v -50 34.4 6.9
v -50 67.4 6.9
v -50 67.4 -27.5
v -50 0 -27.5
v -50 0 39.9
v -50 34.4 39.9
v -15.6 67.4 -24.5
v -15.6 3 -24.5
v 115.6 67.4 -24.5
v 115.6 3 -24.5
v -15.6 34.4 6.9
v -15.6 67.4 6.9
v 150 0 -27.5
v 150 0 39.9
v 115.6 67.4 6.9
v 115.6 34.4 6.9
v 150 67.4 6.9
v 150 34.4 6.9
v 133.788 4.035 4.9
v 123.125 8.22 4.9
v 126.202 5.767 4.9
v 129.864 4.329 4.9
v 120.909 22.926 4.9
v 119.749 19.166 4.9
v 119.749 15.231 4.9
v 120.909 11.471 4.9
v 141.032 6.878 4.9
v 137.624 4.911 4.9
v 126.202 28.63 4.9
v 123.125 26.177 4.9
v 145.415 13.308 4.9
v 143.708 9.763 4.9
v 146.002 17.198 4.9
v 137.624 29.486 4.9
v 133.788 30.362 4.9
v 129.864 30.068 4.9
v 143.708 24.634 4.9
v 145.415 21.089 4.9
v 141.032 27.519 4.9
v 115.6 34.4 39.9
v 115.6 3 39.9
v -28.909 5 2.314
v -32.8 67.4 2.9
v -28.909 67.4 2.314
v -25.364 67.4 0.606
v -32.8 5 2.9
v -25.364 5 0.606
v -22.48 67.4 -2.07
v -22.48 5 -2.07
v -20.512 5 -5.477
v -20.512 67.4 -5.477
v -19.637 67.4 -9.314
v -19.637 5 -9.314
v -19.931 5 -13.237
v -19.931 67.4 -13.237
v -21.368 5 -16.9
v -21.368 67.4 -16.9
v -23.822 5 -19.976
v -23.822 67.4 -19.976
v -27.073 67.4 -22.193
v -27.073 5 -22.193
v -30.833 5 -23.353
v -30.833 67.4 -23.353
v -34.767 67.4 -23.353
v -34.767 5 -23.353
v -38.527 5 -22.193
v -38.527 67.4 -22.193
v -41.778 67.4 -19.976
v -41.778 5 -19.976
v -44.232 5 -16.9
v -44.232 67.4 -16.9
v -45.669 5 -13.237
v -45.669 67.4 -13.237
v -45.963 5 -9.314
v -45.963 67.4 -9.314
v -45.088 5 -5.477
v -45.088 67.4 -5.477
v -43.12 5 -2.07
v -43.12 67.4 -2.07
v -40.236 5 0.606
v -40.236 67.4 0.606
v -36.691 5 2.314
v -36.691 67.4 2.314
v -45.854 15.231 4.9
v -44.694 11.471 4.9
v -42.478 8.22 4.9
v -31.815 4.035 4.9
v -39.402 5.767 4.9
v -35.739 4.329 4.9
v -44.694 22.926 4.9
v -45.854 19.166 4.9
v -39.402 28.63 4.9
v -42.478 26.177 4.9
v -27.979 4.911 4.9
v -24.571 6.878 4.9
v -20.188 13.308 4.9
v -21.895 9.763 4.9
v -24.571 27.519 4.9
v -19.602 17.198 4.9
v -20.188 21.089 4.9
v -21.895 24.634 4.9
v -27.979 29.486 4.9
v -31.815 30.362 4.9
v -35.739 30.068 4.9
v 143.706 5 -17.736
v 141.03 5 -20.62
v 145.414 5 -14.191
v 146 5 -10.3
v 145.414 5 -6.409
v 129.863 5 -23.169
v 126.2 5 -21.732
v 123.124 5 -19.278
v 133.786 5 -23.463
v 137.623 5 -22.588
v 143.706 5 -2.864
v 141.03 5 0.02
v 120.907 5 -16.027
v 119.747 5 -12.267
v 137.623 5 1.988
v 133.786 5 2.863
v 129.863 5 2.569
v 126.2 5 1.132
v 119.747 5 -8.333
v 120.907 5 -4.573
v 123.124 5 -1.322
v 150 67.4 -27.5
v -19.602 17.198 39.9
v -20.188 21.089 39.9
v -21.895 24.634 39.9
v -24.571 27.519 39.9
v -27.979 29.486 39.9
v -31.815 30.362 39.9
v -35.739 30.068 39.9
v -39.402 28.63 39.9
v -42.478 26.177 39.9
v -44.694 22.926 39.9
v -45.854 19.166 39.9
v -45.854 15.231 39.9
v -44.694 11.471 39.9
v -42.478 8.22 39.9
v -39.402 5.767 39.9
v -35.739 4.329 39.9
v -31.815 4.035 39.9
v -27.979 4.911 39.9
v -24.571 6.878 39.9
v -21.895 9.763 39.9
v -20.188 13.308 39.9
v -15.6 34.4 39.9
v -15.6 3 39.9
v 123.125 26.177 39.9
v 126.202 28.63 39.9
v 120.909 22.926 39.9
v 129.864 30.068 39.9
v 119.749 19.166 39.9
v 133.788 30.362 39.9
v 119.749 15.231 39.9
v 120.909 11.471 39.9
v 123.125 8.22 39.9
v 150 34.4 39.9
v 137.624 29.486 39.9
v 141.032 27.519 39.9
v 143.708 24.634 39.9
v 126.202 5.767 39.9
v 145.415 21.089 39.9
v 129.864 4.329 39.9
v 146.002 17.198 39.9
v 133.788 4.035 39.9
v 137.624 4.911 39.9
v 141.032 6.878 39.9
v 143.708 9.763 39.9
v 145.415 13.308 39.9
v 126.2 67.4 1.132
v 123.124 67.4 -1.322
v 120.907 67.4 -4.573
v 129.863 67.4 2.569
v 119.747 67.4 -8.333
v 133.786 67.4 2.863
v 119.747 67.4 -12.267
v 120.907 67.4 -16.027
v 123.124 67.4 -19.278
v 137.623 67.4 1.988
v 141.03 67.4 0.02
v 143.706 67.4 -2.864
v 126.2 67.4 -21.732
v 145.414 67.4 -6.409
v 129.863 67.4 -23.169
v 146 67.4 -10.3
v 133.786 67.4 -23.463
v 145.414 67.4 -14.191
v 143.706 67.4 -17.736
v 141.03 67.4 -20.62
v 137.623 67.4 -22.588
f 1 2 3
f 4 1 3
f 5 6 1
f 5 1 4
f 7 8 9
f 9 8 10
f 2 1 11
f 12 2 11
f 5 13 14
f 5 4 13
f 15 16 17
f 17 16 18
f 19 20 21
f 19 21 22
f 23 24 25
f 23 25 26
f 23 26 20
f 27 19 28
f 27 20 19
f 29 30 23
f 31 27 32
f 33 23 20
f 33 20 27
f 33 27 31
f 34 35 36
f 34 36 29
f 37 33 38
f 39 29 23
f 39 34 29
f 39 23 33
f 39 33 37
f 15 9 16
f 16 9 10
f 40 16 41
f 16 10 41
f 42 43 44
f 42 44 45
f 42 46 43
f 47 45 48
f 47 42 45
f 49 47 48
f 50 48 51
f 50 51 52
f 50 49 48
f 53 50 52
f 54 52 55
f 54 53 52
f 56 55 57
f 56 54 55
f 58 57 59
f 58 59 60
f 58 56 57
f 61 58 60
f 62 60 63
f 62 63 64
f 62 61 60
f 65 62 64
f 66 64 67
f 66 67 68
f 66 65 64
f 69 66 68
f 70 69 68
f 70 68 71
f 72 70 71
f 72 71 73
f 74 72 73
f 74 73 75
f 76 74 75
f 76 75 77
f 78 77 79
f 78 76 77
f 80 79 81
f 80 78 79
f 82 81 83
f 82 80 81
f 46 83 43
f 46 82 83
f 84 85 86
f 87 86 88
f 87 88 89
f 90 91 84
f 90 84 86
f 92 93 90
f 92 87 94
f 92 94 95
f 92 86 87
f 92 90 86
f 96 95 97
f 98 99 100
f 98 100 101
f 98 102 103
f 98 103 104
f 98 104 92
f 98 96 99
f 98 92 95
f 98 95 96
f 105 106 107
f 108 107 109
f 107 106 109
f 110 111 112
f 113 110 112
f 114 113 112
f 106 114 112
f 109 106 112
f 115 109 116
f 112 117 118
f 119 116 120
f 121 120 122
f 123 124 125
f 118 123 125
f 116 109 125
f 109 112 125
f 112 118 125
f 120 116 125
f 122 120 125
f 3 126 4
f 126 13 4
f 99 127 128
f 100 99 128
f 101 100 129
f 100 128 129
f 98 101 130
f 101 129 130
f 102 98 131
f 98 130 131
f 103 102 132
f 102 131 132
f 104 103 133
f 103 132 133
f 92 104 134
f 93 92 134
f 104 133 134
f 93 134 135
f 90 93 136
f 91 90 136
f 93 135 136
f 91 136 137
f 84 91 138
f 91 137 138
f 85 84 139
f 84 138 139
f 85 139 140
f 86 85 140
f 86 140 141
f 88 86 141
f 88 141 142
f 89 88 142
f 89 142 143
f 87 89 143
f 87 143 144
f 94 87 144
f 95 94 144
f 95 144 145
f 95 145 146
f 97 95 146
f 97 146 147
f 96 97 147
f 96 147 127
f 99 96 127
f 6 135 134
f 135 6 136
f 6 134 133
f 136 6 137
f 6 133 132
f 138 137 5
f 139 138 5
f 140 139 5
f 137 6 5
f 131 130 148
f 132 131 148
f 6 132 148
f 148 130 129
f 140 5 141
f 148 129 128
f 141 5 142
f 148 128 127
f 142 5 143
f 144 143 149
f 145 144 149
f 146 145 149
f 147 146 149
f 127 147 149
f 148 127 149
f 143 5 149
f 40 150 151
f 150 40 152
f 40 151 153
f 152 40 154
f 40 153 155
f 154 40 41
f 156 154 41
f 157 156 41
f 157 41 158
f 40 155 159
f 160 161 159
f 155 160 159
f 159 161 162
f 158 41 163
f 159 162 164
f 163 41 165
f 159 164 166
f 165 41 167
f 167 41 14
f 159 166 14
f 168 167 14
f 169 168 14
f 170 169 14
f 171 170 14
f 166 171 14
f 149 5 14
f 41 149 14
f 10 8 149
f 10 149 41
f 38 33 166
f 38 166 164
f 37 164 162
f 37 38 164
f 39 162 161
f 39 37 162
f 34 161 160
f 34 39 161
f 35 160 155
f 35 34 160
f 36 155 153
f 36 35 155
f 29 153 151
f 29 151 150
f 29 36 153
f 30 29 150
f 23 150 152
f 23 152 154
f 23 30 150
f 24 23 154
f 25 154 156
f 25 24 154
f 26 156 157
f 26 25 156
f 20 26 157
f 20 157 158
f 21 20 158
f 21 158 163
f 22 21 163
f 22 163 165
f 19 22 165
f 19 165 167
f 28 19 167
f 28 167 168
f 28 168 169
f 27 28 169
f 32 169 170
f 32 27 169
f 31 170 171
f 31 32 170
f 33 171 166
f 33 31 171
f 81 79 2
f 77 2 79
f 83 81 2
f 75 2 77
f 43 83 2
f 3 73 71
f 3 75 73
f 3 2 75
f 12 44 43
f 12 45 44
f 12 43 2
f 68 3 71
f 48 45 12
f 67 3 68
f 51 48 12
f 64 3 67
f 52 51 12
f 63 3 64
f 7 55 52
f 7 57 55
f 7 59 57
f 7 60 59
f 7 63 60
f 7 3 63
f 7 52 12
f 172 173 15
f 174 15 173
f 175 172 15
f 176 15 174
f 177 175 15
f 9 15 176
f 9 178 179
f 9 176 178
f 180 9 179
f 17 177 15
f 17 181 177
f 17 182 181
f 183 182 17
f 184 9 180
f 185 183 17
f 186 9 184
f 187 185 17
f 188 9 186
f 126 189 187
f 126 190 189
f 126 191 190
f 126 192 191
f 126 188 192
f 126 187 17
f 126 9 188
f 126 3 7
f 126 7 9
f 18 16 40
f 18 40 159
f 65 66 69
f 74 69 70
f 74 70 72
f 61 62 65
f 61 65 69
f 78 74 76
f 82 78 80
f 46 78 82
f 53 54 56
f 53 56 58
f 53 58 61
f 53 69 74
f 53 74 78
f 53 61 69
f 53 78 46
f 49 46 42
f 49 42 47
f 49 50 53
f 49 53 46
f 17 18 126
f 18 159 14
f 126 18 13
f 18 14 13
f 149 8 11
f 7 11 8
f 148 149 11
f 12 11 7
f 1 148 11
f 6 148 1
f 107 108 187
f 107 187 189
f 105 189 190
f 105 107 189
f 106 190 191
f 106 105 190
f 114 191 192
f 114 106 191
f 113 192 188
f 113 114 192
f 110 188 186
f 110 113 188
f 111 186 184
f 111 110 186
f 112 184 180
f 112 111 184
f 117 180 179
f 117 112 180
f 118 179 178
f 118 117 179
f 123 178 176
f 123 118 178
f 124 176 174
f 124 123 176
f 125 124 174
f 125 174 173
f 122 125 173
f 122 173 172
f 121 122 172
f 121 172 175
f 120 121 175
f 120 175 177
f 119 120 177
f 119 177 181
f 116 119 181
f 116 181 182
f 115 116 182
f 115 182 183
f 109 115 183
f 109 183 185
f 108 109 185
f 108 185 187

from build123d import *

# Parameters (mm, degrees)
SKETCH1_R           = 13.2
BOSS_EXTRUDE3_DEPTH = 5
SKETCH1_6_W         = 100
SKETCH1_6_H         = 55
SKETCH1_6_R         = 13.2
BOSS_EXTRUDE4_DEPTH = 55
SKETCH2_W           = 65.6
SKETCH2_H           = 52
CUT_EXTRUDE1_DEPTH  = 52
SKETCH3_R           = 13.2
CUT_EXTRUDE2_DEPTH  = 22.6
SKETCH4_W           = 20.6
SKETCH4_H           = 20.6
CUT_EXTRUDE4_DEPTH  = 39
SKETCH9_R           = 13.2
BOSS_EXTRUDE5_DEPTH = 12.4
BOSS_EXTRUDE7_START = 12.4
SKETCH10_R          = 13.2
BOSS_EXTRUDE7_DEPTH = 12.4
MIRROR1_START       = 30.398461356
MIRROR1_OUTLINE_R   = 13.2
MIRROR1_DEPTH       = 37.001538644
MIRROR1_2_OUTLINE_W = 100
MIRROR1_2_OUTLINE_H = 67.4
MIRROR1_2_OUTLINE_R = 13.2
MIRROR1_2_DEPTH     = 3
MIRROR1_3_OUTLINE_W = 34.4
MIRROR1_3_OUTLINE_H = 33
MIRROR1_3_DEPTH     = 4.001538644
MIRROR1_START_2     = 3
MIRROR1_4_OUTLINE_R = 13.2
MIRROR1_4_DEPTH     = 0.998461256
MIRROR1_START_3     = 3.998461256
MIRROR1_5_OUTLINE_R = 13.2
MIRROR1_5_DEPTH     = 26.4000001
MIRROR1_START_4     = 4.9
MIRROR1_6_OUTLINE_R = 13.2
MIRROR1_6_DEPTH     = 35


with BuildPart() as part:
    # Sketch1 → Boss-Extrude3 (new body)
    with BuildSketch(Plane(origin=(0, 0, 0), x_dir=(1, 0, 0), z_dir=(0, 1, 0))):
        with Locations(Location((-32.8, 10.3, 0), (0, 0, 270))):
            Circle(SKETCH1_R)
    boss_extrude3 = extrude(amount=BOSS_EXTRUDE3_DEPTH)

    # Sketch1<6> → Boss-Extrude4 (add)
    with BuildSketch(Plane(origin=(0, 0, 0), x_dir=(1, 0, 0), z_dir=(0, 1, 0))):
        Rectangle(SKETCH1_6_W, SKETCH1_6_H)
        with Locations(Location((-32.8, 10.3, 0), (0, 0, 270))):
            Circle(SKETCH1_6_R, mode=Mode.SUBTRACT)
    extrude(amount=BOSS_EXTRUDE4_DEPTH)

    # Sketch2 → Cut-Extrude1 (cut)
    with BuildSketch(Plane(origin=(0, 55, 0), x_dir=(1, 0, 0), z_dir=(0, 1, 0))):
        with Locations((17.2, -1.5)):
            Rectangle(SKETCH2_W, SKETCH2_H)
    extrude(amount=-CUT_EXTRUDE1_DEPTH, mode=Mode.SUBTRACT)

    # Sketch3 → Cut-Extrude2 (cut)
    with BuildSketch(Plane.XY.offset(27.5)):
        with Locations((-32.801538644, 17.198461356)):
            Circle(SKETCH3_R)
    extrude(amount=-CUT_EXTRUDE2_DEPTH, mode=Mode.SUBTRACT)

    # Sketch4 → Cut-Extrude4 (cut)
    with BuildSketch(Plane.ZY.offset(50)):
        with Locations((17.2, 44.7)):
            Rectangle(SKETCH4_W, SKETCH4_H)
    extrude(amount=-CUT_EXTRUDE4_DEPTH, mode=Mode.SUBTRACT)

    # Sketch9 → Boss-Extrude5 (add)
    with BuildSketch(Plane(origin=(0, 55, 0), x_dir=(1, 0, 0), z_dir=(0, 1, 0))):
        Polygon((-50, -6.9), (-15.6, -6.9), (-15.6, 24.5), (50, 24.5), (50, 27.5), (-50, 27.5), align=None)
        with Locations(Location((-32.8, 10.3, 0), (0, 0, 270))):
            Circle(SKETCH9_R, mode=Mode.SUBTRACT)
    extrude(amount=BOSS_EXTRUDE5_DEPTH)

    # Sketch10 → Boss-Extrude7 (add)
    with BuildSketch(Plane.XY.offset(27.5).offset(BOSS_EXTRUDE7_START)):
        Polygon((-15.6, 3), (-15.6, 34.4), (-50, 34.4), (-50, 0), (50, 0), (50, 3), align=None)
        with Locations((-32.801538644, 17.198461356)):
            Circle(SKETCH10_R, mode=Mode.SUBTRACT)
    extrude(amount=-BOSS_EXTRUDE7_DEPTH)

    # Mirror1: read off the stored shape, not the designer's step
    # Mirror1 outline → Mirror1 (add)
    with BuildSketch(Plane(origin=(0, 0, 0), x_dir=(1, 0, 0), z_dir=(0, 1, 0)).offset(MIRROR1_START)):
        Polygon((150, -6.9), (150, 27.5), (50, 27.5), (50, 24.5), (115.6, 24.5), (115.6, -6.9), align=None)
        with Locations((132.8, 10.3)):
            Circle(MIRROR1_OUTLINE_R, mode=Mode.SUBTRACT)
    extrude(amount=MIRROR1_DEPTH)

    # Mirror1 2 outline → Mirror1 2 (add)
    with BuildSketch(Plane(origin=(0, 0, 0), x_dir=(1, 0, 0), z_dir=(0, 1, 0))):
        with Locations((100, -6.2)):
            Rectangle(MIRROR1_2_OUTLINE_W, MIRROR1_2_OUTLINE_H)
        with Locations((132.8, 10.3)):
            Circle(MIRROR1_2_OUTLINE_R, mode=Mode.SUBTRACT)
    extrude(amount=MIRROR1_2_DEPTH)

    # Mirror1 3 outline → Mirror1 3 (add)
    with BuildSketch(Plane(origin=(0, 0, 0), x_dir=(1, 0, 0), z_dir=(0, 1, 0)).offset(MIRROR1_START)):
        with Locations((132.8, -23.4)):
            Rectangle(MIRROR1_3_OUTLINE_W, MIRROR1_3_OUTLINE_H)
    extrude(amount=MIRROR1_3_DEPTH)

    # Mirror1 4 outline → Mirror1 4 (add)
    with BuildSketch(Plane(origin=(0, 0, 0), x_dir=(1, 0, 0), z_dir=(0, 1, 0)).offset(MIRROR1_START_2)):
        Polygon((150, 27.5), (50, 27.5), (50, 24.5), (115.6, 24.5), (115.6, -39.9), (150, -39.9), align=None)
        with Locations((132.8, 10.3)):
            Circle(MIRROR1_4_OUTLINE_R, mode=Mode.SUBTRACT)
    extrude(amount=MIRROR1_4_DEPTH)

    # Mirror1 5 outline → Mirror1 5 (add)
    with BuildSketch(Plane(origin=(0, 0, 0), x_dir=(1, 0, 0), z_dir=(0, 1, 0)).offset(MIRROR1_START_3)):
        Polygon((150, -39.9), (150, 27.5), (50, 27.5), (50, 24.5), (115.6, 24.5), (115.6, -39.9), align=None)
        with Locations((132.8, 10.3)):
            Circle(MIRROR1_5_OUTLINE_R, mode=Mode.SUBTRACT)
    extrude(amount=MIRROR1_5_DEPTH)

    # Mirror1 6 outline → Mirror1 6 (cut)
    with BuildSketch(Plane.XY.offset(MIRROR1_START_4)):
        with Locations((132.801538644, 17.198461356)):
            Circle(MIRROR1_6_OUTLINE_R)
    extrude(amount=MIRROR1_6_DEPTH, mode=Mode.SUBTRACT)

    # Mirror2: Boss-Extrude3 across plane
    add(boss_extrude3.mirror(Plane.ZY.offset(-50)))


solid = part.part
